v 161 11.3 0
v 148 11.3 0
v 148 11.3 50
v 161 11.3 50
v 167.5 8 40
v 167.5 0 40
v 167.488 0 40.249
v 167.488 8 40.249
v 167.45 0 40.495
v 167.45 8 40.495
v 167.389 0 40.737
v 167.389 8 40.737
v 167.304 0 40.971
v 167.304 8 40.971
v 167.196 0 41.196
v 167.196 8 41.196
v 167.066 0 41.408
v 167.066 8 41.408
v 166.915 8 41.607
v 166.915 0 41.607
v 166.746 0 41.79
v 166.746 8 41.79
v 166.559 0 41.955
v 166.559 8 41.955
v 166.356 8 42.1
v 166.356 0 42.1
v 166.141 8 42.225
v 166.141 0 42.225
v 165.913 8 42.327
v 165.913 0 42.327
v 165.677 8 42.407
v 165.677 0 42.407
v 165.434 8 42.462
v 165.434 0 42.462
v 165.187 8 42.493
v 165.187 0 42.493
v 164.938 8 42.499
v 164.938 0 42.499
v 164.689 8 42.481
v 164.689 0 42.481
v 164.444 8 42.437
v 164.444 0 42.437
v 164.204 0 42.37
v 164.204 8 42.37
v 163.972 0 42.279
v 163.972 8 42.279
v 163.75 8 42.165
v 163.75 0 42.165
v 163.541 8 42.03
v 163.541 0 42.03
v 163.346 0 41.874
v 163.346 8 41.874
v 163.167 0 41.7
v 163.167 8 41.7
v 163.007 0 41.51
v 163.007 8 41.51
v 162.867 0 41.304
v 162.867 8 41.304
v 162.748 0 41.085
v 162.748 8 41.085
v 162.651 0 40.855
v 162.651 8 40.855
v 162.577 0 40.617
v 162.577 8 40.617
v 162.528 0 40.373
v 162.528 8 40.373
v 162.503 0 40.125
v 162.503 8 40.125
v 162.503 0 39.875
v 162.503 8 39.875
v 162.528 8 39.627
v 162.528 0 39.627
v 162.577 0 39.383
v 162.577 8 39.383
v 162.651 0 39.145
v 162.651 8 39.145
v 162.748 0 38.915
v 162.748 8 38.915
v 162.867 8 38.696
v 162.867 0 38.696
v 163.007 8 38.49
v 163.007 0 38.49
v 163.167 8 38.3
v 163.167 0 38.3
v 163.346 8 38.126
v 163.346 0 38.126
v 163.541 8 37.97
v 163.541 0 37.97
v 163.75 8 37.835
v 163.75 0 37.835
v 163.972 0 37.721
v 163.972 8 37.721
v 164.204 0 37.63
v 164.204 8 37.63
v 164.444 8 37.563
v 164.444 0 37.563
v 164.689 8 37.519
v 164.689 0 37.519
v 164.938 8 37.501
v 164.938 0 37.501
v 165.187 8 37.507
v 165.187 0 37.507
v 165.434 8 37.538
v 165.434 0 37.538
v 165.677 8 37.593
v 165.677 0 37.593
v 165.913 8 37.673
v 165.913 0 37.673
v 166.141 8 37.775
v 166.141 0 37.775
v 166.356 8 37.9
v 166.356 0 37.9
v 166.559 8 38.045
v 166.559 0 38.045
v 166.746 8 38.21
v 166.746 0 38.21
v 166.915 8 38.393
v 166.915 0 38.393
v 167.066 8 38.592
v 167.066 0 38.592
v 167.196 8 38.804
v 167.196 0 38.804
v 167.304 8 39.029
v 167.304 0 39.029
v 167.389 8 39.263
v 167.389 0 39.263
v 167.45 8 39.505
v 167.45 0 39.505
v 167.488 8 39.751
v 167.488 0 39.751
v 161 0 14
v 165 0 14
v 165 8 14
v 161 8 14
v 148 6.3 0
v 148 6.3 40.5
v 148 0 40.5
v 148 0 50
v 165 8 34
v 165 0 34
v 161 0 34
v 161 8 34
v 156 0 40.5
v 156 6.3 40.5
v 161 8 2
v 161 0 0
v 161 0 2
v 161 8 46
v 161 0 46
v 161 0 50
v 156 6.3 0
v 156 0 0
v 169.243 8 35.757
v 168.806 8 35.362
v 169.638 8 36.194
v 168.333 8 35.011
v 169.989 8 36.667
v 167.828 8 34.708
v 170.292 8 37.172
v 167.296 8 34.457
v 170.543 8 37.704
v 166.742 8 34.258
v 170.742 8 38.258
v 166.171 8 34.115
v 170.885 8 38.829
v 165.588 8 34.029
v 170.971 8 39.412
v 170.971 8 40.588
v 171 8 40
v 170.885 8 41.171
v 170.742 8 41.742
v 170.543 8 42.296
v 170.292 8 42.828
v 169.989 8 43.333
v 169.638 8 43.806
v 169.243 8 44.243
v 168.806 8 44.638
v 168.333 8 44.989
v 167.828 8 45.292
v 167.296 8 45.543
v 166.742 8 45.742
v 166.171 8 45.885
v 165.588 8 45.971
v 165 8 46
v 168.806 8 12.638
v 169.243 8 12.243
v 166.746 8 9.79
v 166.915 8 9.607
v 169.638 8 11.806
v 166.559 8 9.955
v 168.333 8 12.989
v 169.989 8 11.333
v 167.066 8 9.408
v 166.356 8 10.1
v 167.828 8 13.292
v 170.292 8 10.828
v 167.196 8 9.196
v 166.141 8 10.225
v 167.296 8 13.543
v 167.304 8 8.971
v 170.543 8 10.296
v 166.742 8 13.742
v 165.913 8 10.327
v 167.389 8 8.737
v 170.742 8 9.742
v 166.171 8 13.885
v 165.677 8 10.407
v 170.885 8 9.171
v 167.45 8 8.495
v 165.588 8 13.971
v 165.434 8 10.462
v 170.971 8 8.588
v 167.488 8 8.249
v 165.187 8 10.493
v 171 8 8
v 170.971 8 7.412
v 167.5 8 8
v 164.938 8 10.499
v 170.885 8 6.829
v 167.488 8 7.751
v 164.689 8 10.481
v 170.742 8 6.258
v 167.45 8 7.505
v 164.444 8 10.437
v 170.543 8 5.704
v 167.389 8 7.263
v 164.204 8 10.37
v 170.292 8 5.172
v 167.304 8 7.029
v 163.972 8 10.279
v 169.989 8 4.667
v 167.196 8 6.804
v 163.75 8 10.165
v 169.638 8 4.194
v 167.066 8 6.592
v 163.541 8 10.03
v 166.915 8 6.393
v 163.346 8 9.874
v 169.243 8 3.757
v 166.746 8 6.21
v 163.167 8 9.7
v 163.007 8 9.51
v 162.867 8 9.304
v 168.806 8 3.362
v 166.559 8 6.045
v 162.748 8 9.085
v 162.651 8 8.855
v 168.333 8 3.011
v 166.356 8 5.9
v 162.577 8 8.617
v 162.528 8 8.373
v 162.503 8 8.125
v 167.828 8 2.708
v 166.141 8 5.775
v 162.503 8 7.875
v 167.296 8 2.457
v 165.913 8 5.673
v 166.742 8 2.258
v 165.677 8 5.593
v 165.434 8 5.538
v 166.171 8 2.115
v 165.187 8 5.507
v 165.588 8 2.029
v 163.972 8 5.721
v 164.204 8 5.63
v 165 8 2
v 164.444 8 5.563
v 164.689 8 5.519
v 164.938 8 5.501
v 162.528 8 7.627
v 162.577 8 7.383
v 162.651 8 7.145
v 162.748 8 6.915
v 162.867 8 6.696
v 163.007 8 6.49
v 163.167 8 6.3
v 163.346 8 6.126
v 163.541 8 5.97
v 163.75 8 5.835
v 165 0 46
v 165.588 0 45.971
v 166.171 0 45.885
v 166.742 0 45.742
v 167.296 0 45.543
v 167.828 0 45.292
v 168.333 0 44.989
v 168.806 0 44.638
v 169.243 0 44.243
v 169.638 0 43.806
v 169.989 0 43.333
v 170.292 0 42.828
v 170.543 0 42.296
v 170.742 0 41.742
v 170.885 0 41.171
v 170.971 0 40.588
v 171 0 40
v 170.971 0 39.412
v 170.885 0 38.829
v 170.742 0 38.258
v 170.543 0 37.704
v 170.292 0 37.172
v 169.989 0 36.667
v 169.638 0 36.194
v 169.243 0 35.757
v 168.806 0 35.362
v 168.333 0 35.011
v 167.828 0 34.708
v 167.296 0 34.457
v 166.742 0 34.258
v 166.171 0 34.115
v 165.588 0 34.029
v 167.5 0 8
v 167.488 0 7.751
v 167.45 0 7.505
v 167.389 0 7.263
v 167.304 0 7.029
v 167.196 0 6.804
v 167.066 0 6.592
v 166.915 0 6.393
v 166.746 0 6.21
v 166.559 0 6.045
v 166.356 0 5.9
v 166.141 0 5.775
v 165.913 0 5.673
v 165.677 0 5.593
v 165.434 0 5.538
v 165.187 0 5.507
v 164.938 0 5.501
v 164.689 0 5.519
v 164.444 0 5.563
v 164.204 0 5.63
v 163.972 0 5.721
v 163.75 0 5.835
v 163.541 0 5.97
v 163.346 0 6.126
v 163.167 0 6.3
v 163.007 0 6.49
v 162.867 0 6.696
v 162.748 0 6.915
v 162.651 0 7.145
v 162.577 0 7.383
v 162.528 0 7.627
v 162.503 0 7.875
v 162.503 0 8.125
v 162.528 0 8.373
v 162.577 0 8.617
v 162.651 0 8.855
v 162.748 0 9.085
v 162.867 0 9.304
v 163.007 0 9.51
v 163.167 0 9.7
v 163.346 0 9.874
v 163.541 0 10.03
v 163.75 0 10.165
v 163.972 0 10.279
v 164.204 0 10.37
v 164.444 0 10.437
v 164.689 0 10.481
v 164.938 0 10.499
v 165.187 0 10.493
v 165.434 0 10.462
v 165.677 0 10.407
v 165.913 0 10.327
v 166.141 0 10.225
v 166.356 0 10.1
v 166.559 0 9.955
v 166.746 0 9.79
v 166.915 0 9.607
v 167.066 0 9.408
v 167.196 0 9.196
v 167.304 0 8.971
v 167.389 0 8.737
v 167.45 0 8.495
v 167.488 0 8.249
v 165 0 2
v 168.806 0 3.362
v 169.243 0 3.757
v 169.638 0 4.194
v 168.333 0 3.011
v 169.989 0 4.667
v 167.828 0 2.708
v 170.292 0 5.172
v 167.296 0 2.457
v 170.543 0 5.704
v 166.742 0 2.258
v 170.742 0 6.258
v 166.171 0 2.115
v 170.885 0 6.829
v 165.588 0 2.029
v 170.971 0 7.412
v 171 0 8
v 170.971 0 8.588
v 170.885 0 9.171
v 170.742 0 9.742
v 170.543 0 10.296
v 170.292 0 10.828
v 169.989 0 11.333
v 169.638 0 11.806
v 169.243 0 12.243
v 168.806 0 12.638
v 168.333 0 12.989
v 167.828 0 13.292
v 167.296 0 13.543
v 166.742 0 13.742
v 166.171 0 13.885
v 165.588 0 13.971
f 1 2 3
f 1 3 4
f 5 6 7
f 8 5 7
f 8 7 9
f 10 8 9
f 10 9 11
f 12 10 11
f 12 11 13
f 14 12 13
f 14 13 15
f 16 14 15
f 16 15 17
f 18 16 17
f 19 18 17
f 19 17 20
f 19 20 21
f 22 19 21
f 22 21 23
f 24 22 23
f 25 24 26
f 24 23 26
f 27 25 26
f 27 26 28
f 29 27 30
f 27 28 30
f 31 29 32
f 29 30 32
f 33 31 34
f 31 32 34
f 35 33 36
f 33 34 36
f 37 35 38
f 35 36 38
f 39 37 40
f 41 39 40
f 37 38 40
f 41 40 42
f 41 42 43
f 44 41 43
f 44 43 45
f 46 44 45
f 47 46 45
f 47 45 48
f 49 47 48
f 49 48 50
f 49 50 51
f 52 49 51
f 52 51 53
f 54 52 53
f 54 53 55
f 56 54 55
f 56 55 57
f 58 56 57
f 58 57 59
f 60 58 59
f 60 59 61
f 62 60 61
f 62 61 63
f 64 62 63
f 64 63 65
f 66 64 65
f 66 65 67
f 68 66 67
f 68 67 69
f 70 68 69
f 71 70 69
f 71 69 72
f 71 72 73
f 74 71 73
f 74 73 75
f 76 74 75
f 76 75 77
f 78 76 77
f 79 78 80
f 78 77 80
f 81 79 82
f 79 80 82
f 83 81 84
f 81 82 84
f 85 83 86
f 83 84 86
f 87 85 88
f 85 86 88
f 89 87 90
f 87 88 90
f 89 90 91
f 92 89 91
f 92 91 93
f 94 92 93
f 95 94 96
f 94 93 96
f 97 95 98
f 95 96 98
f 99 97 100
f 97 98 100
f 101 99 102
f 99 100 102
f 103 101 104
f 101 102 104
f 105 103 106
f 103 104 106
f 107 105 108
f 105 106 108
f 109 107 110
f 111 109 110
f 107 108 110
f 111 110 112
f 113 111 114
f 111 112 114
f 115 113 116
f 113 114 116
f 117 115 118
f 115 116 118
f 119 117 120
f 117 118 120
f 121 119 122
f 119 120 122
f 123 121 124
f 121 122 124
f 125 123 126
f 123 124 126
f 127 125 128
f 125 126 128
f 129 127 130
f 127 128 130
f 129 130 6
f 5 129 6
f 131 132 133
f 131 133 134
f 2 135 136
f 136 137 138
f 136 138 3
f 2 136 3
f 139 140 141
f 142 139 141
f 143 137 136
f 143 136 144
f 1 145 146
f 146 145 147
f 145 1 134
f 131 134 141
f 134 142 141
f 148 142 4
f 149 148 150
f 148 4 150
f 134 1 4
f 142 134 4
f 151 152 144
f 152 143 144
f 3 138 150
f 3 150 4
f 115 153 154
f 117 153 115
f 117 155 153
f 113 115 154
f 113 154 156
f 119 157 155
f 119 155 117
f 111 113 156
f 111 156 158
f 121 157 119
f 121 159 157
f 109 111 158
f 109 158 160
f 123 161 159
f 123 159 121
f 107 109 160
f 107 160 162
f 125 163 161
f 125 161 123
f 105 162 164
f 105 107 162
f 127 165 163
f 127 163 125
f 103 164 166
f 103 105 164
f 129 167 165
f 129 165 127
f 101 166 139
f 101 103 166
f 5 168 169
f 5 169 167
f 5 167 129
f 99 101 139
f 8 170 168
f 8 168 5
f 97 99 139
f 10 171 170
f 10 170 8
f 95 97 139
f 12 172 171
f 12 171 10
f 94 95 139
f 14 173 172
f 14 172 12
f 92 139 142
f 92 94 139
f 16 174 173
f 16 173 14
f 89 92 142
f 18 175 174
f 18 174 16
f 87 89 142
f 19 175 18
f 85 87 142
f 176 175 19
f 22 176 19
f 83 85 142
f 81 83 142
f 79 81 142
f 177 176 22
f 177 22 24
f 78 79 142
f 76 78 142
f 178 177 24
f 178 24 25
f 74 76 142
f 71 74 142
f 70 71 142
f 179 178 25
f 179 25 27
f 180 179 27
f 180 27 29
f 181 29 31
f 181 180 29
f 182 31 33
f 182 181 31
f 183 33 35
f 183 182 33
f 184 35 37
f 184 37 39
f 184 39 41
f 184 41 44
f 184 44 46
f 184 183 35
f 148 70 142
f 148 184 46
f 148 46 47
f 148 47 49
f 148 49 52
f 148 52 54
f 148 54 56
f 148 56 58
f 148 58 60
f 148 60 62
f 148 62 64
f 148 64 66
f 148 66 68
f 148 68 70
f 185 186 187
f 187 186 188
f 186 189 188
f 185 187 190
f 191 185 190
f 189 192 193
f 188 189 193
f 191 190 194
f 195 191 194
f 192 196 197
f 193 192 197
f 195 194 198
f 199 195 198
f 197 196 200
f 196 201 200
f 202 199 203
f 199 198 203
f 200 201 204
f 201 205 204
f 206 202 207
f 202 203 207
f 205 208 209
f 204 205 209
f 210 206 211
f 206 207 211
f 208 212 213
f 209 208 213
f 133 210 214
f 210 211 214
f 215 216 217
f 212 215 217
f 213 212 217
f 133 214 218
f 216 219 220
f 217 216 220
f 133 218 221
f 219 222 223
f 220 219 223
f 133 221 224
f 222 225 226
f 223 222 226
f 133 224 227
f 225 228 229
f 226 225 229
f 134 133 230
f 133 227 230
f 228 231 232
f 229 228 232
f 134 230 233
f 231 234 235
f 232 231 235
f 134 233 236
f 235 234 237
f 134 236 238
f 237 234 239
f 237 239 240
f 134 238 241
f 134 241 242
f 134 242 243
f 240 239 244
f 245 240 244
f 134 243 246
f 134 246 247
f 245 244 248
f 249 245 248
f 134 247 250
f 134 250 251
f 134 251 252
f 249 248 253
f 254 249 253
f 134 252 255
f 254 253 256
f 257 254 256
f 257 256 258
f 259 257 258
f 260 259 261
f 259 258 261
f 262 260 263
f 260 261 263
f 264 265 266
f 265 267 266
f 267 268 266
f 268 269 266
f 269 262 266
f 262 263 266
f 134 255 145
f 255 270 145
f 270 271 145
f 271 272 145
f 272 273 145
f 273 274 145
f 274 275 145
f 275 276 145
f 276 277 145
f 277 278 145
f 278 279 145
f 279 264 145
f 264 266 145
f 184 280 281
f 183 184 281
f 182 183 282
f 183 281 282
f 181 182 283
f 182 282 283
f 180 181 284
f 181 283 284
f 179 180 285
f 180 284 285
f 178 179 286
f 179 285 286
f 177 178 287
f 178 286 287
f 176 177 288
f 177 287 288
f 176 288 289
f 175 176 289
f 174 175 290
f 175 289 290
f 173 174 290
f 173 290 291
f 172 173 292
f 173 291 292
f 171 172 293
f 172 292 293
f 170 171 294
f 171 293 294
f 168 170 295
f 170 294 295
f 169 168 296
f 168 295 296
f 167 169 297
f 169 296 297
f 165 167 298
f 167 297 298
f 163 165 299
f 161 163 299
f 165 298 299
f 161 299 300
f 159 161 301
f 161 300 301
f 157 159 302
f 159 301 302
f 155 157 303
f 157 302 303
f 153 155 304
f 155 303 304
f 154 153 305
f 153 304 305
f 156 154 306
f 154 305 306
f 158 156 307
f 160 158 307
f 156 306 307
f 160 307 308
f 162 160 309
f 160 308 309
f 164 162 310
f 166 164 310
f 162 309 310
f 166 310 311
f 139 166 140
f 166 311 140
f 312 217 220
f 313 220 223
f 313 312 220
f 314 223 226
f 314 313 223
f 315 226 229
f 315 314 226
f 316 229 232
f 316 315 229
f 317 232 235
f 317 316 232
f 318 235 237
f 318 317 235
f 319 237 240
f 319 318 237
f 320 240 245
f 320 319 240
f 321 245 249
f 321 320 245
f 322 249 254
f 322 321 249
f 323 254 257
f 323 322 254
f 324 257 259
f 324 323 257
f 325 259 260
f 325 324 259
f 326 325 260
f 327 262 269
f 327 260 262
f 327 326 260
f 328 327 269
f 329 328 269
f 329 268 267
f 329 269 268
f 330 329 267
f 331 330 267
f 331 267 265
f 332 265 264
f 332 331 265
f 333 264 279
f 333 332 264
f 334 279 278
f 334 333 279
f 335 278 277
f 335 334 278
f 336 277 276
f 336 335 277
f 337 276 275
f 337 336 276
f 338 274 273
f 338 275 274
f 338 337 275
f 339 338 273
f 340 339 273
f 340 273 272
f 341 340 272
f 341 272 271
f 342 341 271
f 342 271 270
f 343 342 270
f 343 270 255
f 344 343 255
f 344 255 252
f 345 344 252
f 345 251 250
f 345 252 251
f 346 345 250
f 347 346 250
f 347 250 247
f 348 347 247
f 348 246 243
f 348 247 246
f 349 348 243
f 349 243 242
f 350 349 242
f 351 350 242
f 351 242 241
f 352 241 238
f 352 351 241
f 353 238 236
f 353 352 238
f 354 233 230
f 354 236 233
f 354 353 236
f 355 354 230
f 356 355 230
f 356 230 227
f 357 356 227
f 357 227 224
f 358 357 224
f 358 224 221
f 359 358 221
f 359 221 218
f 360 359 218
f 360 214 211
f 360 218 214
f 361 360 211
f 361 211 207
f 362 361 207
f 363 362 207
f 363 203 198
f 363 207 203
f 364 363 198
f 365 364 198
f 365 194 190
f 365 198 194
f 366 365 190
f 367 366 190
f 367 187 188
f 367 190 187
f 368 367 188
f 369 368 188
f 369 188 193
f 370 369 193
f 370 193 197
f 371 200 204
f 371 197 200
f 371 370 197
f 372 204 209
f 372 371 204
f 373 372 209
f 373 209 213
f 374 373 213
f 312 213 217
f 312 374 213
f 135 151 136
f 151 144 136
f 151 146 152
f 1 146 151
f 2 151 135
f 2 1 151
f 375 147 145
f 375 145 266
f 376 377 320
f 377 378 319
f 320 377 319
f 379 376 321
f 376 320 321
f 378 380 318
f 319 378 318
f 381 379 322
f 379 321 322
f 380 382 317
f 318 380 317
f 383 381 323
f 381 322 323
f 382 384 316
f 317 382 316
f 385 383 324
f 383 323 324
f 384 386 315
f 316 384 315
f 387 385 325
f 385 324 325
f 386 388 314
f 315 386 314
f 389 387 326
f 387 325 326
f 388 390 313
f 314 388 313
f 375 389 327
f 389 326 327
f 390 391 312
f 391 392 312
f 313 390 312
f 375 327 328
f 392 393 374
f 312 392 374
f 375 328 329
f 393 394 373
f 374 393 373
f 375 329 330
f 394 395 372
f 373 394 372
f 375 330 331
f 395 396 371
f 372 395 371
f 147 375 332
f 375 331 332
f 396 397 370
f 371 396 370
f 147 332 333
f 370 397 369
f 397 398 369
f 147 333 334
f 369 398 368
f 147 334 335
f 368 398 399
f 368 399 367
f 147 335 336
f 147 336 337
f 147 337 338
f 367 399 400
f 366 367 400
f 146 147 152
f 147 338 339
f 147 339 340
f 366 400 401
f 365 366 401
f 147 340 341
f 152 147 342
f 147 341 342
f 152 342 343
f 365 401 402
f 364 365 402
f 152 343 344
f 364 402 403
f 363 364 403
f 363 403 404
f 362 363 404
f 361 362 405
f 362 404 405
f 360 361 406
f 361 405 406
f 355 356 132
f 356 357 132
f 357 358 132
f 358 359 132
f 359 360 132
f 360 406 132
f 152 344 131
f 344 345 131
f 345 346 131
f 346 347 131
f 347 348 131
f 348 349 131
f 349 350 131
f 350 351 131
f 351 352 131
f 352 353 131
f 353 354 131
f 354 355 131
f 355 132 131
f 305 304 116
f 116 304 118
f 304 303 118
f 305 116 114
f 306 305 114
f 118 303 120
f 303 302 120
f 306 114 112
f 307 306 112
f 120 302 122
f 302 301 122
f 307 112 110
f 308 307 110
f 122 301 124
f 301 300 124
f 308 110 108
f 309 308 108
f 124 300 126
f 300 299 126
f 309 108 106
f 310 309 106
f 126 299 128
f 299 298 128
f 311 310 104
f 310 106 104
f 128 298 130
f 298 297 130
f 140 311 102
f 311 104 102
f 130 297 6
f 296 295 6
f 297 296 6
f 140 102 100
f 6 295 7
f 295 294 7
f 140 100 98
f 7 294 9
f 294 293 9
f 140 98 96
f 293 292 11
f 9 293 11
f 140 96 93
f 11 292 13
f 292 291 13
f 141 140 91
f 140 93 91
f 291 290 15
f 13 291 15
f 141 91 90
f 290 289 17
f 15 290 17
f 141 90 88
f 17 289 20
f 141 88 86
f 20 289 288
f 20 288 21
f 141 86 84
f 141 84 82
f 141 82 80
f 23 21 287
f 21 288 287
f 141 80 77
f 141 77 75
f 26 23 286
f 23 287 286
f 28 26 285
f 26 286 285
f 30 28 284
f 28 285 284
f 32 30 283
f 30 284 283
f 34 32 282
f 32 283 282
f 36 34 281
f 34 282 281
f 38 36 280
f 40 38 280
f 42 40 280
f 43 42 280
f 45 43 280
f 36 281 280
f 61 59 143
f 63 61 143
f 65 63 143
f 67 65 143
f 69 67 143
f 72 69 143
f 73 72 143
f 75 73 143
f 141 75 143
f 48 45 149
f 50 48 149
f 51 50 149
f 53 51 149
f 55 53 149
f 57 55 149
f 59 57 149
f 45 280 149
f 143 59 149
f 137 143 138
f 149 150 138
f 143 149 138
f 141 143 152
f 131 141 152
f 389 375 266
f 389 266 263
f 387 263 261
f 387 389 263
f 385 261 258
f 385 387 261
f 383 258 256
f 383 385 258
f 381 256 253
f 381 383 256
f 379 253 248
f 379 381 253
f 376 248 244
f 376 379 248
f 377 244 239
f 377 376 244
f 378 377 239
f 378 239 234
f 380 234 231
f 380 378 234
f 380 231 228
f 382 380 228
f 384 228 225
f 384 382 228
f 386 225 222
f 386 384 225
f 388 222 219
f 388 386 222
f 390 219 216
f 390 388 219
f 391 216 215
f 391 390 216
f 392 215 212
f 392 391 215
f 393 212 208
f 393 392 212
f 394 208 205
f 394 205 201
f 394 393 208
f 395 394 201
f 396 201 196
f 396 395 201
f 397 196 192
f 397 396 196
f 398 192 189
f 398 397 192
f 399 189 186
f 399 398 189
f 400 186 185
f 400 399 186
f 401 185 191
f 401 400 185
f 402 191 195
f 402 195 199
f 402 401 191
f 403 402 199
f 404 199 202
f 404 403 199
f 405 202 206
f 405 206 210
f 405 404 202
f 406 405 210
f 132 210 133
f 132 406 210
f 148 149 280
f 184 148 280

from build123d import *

# Parameters (mm, degrees)
CROQUIS4_W                = 13
CROQUIS4_H                = 11.3
SALIENTE_EXTRUIR1_DEPTH   = 161
CROQUIS5_W                = 151
CROQUIS5_H                = 3.5
CORTAR_EXTRUIR1_DEPTH     = 6.3
SALIENTE_EXTRUIR3_DEPTH   = 8
CROQUIS9_R                = 2.5
CORTAR_EXTRUIR3_DEPTH     = 179.518038304
SIMETR_A8_COPY_1_DEPTH    = 8
SIMETR_A8_COPY_2_SKETCH_R = 2.5
SIMETR_A8_COPY_2_DEPTH    = 179.518038304
CROQUIS10_R               = 2.5
CORTAR_EXTRUIR4_DEPTH     = 179.518038304
MATRIZL1_COUNT            = 3
MATRIZL1_PITCH            = 40.5
CROQUIS11_W               = 61.925542409
CROQUIS11_H               = 21.407853528
CORTAR_EXTRUIR5_DEPTH     = 167.107465215


with BuildPart() as part:
    # Barrer1: sweep along a path in Croquis3
    with BuildLine(Plane(origin=(0, 0, 0), x_dir=(1, 0, 0), z_dir=(0, 1, 0))) as barrer1_path:
        Line((0, 0), (0, -37))
    # Croquis1 → Barrer1 (sweep)
    with BuildSketch(Plane.XY):
        Polygon((0, 0), (0, 11.3), (13, 11.3), (13, 6.3), (5, 6.3), (5, 0), align=None)
    barrer1 = sweep(path=barrer1_path.line)

    # Croquis4 → Saliente-Extruir1 (add)
    with BuildSketch(Plane.ZY):
        with Locations((43.5, 5.65)):
            Rectangle(CROQUIS4_W, CROQUIS4_H)
    extrude(amount=-SALIENTE_EXTRUIR1_DEPTH)

    # Simetría5: Barrer1 across plane
    add(barrer1.mirror(Plane.ZY.offset(-80.5)))

    # Croquis5 → Cortar-Extruir1 (cut)
    with BuildSketch(Plane.XZ):
        with Locations((80.5, 38.75)):
            Rectangle(CROQUIS5_W, CROQUIS5_H)
    extrude(amount=-CORTAR_EXTRUIR1_DEPTH, mode=Mode.SUBTRACT)

    # Croquis8 → Saliente-Extruir3 (add)
    with BuildSketch(Plane.XZ):
        with BuildLine():
            Line((161, 46), (165, 46))
            ThreePointArc((165, 46), (171, 40), (165, 34))
            Line((165, 34), (161, 34))
            Line((161, 34), (161, 46))
        make_face()
    saliente_extruir3 = extrude(amount=-SALIENTE_EXTRUIR3_DEPTH)

    # Croquis9 → Cortar-Extruir3 (cut, through all)
    with BuildSketch(Plane.XZ):
        with Locations((165, 40)):
            Circle(CROQUIS9_R)
    cortar_extruir3 = extrude(amount=-CORTAR_EXTRUIR3_DEPTH, mode=Mode.SUBTRACT)

    # Simetría7: Saliente-Extruir3, Cortar-Extruir3 across plane
    add(saliente_extruir3.mirror(Plane(origin=(0, 0, 24), x_dir=(1, 0, 0), z_dir=(0, 0, -1))))
    add(cortar_extruir3.mirror(Plane(origin=(0, 0, 24), x_dir=(1, 0, 0), z_dir=(0, 0, -1))), mode=Mode.SUBTRACT)

    # Simetría8: Saliente-Extruir3, Cortar-Extruir3 across plane
    add(saliente_extruir3.mirror(Plane.ZY.offset(-80.5)))
    add(cortar_extruir3.mirror(Plane.ZY.offset(-80.5)), mode=Mode.SUBTRACT)

    # Simetría8 copy 1 sketch → Simetría8 copy 1 (add)
    with BuildSketch(Plane(origin=(161, 0, 48), x_dir=(-1, 0, 0), z_dir=(0, -1, 0))):
        with BuildLine():
            Line((161, 46), (165, 46))
            ThreePointArc((165, 46), (171, 40), (165, 34))
            Line((165, 34), (161, 34))
            Line((161, 34), (161, 46))
        make_face()
    extrude(amount=-SIMETR_A8_COPY_1_DEPTH)

    # Simetría8 copy 2 sketch → Simetría8 copy 2 (cut, through all)
    with BuildSketch(Plane(origin=(161, 0, 48), x_dir=(-1, 0, 0), z_dir=(0, -1, 0))):
        with Locations((165, 40)):
            Circle(SIMETR_A8_COPY_2_SKETCH_R)
    extrude(amount=-SIMETR_A8_COPY_2_DEPTH, mode=Mode.SUBTRACT)

    # Croquis10 → Cortar-Extruir4 (cut, through all)
    with BuildSketch(Plane(origin=(0, 11.3, 0), x_dir=(1, 0, 0), z_dir=(0, 1, 0))):
        with Locations(Location((121, -45.25, 0), (0, 0, 270))):
            Circle(CROQUIS10_R)
    cortar_extruir4 = extrude(amount=-CORTAR_EXTRUIR4_DEPTH, mode=Mode.SUBTRACT)

    # MatrizL1: Cortar-Extruir4 ×3
    with Locations(*[(-i * MATRIZL1_PITCH, 0, 0) for i in range(1, MATRIZL1_COUNT)]):
        add(cortar_extruir4, mode=Mode.SUBTRACT)

    # Croquis11 → Cortar-Extruir5 (cut, through all)
    with BuildSketch(Plane.ZY.offset(-148)):
        with Locations((24.861164112, 5.775)):
            Rectangle(CROQUIS11_W, CROQUIS11_H)
    extrude(amount=CORTAR_EXTRUIR5_DEPTH, mode=Mode.SUBTRACT)


solid = part.part
